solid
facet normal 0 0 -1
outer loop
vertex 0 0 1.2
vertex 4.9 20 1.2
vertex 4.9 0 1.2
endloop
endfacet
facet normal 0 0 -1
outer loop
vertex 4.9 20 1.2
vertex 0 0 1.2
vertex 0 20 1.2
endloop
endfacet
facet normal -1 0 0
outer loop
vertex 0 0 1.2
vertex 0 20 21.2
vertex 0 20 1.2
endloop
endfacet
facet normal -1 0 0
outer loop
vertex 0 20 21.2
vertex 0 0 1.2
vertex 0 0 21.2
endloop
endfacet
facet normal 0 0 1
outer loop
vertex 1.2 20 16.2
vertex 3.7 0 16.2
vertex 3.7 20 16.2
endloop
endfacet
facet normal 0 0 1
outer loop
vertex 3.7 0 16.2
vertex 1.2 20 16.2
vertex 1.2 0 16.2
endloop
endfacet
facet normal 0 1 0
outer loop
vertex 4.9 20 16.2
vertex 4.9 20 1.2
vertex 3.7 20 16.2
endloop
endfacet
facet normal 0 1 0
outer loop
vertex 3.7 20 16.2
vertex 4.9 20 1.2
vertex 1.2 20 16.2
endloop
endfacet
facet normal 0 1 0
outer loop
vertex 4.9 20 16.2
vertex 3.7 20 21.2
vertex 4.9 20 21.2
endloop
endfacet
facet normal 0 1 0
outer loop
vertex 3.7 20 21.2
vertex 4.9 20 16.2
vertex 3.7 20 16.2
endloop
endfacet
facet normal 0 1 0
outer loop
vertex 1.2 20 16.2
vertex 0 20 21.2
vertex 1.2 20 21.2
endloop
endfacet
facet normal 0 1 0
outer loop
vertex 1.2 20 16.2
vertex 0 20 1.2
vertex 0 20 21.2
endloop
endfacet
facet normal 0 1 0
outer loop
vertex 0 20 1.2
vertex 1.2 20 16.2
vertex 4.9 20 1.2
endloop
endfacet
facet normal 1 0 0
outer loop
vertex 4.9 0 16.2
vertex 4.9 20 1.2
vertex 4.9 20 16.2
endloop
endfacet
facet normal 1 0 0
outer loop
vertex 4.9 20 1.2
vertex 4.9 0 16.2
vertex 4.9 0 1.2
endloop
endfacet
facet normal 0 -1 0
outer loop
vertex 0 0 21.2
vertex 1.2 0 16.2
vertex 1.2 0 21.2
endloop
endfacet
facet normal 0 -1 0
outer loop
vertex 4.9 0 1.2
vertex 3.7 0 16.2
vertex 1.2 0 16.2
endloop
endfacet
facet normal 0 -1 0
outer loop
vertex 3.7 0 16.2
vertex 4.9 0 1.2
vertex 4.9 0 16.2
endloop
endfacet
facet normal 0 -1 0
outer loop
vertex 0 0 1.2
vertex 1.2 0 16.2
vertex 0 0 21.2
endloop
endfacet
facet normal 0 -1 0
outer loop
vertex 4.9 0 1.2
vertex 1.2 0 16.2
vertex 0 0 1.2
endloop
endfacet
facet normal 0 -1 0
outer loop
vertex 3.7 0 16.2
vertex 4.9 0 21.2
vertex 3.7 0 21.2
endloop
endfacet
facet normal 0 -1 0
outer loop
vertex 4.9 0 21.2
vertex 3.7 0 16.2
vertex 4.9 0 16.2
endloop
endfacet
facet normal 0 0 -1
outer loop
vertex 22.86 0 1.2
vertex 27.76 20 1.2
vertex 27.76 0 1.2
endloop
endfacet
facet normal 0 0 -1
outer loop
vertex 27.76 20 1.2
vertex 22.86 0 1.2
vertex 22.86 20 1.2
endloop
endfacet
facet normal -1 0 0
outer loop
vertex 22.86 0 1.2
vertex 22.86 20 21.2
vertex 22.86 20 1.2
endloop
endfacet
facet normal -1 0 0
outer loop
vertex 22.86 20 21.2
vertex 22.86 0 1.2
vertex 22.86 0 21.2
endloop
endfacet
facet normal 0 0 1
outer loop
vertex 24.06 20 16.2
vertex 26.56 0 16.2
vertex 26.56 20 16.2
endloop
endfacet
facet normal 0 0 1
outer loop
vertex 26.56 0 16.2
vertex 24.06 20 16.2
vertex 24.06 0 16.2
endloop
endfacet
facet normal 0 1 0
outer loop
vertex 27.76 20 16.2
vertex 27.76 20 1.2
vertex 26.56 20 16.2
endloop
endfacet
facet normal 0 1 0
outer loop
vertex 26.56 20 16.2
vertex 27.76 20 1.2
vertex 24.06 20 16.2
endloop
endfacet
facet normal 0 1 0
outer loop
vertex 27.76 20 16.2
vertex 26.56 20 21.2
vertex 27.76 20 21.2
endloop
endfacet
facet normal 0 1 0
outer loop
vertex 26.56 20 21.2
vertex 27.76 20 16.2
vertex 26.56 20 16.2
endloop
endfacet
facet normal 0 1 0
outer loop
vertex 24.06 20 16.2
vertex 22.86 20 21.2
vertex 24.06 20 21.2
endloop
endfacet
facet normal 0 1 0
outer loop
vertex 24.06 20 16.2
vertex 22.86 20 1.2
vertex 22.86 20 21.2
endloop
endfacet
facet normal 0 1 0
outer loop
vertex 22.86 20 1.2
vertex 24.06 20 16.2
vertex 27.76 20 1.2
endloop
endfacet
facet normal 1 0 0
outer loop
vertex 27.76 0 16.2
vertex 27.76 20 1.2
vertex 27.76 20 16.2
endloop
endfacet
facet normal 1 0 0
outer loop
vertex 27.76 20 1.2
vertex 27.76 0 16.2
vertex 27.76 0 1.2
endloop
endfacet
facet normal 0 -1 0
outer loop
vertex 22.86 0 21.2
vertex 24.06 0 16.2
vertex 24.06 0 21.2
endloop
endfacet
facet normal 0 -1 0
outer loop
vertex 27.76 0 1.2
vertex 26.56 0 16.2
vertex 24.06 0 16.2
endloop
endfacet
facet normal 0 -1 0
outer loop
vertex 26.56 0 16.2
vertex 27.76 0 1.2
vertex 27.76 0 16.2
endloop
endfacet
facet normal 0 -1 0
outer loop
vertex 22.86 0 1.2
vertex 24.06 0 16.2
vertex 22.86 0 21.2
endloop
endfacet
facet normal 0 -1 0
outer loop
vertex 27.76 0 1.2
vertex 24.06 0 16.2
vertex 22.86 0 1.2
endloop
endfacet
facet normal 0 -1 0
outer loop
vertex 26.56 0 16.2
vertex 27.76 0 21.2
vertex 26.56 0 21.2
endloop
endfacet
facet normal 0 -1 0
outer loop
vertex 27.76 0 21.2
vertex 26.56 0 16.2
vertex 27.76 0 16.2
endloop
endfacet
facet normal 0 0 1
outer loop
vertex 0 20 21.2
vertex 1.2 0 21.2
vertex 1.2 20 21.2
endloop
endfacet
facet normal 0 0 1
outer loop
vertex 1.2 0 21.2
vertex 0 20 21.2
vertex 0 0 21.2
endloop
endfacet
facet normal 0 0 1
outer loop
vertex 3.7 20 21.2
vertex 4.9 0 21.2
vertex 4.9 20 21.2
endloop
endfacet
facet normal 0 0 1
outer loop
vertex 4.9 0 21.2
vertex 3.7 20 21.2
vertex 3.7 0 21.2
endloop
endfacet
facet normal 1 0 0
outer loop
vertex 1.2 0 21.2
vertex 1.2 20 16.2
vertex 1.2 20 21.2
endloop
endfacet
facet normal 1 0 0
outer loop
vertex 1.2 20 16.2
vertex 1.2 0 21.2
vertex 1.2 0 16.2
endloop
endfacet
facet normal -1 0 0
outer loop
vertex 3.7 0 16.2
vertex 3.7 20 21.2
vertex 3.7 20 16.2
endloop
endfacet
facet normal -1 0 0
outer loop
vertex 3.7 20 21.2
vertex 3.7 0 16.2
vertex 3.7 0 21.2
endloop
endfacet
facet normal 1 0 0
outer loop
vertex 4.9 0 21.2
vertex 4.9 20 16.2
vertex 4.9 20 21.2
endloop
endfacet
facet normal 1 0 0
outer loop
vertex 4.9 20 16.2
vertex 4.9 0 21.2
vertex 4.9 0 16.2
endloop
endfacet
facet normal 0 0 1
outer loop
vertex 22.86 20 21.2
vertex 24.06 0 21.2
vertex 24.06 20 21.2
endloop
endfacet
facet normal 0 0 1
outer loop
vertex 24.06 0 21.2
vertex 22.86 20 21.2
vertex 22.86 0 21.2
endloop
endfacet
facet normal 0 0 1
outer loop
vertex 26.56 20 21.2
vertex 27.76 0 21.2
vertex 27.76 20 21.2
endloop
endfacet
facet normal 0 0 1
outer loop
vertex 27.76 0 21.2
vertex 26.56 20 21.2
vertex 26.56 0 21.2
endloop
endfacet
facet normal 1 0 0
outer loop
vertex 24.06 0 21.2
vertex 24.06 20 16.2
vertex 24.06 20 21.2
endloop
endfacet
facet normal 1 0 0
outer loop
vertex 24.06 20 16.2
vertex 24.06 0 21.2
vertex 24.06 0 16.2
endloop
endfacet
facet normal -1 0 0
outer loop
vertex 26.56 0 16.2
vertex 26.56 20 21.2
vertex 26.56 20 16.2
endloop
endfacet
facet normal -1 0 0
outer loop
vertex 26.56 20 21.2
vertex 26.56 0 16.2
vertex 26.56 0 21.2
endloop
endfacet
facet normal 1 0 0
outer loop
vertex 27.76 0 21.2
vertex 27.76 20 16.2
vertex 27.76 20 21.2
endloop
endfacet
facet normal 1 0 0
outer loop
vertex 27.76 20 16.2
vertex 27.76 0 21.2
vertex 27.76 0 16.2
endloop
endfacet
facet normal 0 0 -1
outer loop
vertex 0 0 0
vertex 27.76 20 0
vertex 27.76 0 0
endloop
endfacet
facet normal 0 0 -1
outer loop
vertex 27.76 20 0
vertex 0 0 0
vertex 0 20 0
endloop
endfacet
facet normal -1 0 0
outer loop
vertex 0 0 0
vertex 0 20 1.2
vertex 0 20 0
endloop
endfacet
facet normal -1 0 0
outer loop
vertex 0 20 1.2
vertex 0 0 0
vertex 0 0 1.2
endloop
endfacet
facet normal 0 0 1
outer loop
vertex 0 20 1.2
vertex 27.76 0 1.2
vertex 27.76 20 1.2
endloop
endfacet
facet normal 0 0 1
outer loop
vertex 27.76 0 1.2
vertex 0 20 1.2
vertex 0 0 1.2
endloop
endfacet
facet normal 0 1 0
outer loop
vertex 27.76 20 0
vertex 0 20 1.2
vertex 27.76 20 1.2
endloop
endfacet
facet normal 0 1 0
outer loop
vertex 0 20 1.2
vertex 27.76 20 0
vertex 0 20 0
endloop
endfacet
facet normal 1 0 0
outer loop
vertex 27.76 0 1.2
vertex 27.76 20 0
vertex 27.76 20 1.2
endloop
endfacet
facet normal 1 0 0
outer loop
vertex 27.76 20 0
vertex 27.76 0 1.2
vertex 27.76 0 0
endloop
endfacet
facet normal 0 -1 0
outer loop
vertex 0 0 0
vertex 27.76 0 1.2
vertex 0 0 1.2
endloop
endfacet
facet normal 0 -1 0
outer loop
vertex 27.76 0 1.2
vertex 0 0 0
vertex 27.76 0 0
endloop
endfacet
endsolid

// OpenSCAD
pinDistance = 22.86;
pinThickness = 2.5;
gripWidth = 20;
gripHeight = 5;
groundClearance = 15;

thickness = 1.2;

module solderHelp() {
    linear_extrude(thickness)
    square([pinDistance + pinThickness + 2 * thickness, gripWidth]);
    
    translate([0, 0, thickness]) {
        groundSpacer();
        
        translate([pinDistance, 0, 0])
        groundSpacer();
    }
    
    translate([0, 0, thickness + groundClearance]) {
        grip();
        
        translate([pinDistance, 0, 0])
        grip();
    }
}

module groundSpacer() {
    linear_extrude(groundClearance)
    square([2 * thickness + pinThickness, gripWidth]);
}

module grip() {
    linear_extrude(gripHeight) {
        square([thickness, gripWidth]);
        
        translate([thickness + pinThickness, 0])
        square([thickness, gripWidth]);
    }
}

solderHelp();
